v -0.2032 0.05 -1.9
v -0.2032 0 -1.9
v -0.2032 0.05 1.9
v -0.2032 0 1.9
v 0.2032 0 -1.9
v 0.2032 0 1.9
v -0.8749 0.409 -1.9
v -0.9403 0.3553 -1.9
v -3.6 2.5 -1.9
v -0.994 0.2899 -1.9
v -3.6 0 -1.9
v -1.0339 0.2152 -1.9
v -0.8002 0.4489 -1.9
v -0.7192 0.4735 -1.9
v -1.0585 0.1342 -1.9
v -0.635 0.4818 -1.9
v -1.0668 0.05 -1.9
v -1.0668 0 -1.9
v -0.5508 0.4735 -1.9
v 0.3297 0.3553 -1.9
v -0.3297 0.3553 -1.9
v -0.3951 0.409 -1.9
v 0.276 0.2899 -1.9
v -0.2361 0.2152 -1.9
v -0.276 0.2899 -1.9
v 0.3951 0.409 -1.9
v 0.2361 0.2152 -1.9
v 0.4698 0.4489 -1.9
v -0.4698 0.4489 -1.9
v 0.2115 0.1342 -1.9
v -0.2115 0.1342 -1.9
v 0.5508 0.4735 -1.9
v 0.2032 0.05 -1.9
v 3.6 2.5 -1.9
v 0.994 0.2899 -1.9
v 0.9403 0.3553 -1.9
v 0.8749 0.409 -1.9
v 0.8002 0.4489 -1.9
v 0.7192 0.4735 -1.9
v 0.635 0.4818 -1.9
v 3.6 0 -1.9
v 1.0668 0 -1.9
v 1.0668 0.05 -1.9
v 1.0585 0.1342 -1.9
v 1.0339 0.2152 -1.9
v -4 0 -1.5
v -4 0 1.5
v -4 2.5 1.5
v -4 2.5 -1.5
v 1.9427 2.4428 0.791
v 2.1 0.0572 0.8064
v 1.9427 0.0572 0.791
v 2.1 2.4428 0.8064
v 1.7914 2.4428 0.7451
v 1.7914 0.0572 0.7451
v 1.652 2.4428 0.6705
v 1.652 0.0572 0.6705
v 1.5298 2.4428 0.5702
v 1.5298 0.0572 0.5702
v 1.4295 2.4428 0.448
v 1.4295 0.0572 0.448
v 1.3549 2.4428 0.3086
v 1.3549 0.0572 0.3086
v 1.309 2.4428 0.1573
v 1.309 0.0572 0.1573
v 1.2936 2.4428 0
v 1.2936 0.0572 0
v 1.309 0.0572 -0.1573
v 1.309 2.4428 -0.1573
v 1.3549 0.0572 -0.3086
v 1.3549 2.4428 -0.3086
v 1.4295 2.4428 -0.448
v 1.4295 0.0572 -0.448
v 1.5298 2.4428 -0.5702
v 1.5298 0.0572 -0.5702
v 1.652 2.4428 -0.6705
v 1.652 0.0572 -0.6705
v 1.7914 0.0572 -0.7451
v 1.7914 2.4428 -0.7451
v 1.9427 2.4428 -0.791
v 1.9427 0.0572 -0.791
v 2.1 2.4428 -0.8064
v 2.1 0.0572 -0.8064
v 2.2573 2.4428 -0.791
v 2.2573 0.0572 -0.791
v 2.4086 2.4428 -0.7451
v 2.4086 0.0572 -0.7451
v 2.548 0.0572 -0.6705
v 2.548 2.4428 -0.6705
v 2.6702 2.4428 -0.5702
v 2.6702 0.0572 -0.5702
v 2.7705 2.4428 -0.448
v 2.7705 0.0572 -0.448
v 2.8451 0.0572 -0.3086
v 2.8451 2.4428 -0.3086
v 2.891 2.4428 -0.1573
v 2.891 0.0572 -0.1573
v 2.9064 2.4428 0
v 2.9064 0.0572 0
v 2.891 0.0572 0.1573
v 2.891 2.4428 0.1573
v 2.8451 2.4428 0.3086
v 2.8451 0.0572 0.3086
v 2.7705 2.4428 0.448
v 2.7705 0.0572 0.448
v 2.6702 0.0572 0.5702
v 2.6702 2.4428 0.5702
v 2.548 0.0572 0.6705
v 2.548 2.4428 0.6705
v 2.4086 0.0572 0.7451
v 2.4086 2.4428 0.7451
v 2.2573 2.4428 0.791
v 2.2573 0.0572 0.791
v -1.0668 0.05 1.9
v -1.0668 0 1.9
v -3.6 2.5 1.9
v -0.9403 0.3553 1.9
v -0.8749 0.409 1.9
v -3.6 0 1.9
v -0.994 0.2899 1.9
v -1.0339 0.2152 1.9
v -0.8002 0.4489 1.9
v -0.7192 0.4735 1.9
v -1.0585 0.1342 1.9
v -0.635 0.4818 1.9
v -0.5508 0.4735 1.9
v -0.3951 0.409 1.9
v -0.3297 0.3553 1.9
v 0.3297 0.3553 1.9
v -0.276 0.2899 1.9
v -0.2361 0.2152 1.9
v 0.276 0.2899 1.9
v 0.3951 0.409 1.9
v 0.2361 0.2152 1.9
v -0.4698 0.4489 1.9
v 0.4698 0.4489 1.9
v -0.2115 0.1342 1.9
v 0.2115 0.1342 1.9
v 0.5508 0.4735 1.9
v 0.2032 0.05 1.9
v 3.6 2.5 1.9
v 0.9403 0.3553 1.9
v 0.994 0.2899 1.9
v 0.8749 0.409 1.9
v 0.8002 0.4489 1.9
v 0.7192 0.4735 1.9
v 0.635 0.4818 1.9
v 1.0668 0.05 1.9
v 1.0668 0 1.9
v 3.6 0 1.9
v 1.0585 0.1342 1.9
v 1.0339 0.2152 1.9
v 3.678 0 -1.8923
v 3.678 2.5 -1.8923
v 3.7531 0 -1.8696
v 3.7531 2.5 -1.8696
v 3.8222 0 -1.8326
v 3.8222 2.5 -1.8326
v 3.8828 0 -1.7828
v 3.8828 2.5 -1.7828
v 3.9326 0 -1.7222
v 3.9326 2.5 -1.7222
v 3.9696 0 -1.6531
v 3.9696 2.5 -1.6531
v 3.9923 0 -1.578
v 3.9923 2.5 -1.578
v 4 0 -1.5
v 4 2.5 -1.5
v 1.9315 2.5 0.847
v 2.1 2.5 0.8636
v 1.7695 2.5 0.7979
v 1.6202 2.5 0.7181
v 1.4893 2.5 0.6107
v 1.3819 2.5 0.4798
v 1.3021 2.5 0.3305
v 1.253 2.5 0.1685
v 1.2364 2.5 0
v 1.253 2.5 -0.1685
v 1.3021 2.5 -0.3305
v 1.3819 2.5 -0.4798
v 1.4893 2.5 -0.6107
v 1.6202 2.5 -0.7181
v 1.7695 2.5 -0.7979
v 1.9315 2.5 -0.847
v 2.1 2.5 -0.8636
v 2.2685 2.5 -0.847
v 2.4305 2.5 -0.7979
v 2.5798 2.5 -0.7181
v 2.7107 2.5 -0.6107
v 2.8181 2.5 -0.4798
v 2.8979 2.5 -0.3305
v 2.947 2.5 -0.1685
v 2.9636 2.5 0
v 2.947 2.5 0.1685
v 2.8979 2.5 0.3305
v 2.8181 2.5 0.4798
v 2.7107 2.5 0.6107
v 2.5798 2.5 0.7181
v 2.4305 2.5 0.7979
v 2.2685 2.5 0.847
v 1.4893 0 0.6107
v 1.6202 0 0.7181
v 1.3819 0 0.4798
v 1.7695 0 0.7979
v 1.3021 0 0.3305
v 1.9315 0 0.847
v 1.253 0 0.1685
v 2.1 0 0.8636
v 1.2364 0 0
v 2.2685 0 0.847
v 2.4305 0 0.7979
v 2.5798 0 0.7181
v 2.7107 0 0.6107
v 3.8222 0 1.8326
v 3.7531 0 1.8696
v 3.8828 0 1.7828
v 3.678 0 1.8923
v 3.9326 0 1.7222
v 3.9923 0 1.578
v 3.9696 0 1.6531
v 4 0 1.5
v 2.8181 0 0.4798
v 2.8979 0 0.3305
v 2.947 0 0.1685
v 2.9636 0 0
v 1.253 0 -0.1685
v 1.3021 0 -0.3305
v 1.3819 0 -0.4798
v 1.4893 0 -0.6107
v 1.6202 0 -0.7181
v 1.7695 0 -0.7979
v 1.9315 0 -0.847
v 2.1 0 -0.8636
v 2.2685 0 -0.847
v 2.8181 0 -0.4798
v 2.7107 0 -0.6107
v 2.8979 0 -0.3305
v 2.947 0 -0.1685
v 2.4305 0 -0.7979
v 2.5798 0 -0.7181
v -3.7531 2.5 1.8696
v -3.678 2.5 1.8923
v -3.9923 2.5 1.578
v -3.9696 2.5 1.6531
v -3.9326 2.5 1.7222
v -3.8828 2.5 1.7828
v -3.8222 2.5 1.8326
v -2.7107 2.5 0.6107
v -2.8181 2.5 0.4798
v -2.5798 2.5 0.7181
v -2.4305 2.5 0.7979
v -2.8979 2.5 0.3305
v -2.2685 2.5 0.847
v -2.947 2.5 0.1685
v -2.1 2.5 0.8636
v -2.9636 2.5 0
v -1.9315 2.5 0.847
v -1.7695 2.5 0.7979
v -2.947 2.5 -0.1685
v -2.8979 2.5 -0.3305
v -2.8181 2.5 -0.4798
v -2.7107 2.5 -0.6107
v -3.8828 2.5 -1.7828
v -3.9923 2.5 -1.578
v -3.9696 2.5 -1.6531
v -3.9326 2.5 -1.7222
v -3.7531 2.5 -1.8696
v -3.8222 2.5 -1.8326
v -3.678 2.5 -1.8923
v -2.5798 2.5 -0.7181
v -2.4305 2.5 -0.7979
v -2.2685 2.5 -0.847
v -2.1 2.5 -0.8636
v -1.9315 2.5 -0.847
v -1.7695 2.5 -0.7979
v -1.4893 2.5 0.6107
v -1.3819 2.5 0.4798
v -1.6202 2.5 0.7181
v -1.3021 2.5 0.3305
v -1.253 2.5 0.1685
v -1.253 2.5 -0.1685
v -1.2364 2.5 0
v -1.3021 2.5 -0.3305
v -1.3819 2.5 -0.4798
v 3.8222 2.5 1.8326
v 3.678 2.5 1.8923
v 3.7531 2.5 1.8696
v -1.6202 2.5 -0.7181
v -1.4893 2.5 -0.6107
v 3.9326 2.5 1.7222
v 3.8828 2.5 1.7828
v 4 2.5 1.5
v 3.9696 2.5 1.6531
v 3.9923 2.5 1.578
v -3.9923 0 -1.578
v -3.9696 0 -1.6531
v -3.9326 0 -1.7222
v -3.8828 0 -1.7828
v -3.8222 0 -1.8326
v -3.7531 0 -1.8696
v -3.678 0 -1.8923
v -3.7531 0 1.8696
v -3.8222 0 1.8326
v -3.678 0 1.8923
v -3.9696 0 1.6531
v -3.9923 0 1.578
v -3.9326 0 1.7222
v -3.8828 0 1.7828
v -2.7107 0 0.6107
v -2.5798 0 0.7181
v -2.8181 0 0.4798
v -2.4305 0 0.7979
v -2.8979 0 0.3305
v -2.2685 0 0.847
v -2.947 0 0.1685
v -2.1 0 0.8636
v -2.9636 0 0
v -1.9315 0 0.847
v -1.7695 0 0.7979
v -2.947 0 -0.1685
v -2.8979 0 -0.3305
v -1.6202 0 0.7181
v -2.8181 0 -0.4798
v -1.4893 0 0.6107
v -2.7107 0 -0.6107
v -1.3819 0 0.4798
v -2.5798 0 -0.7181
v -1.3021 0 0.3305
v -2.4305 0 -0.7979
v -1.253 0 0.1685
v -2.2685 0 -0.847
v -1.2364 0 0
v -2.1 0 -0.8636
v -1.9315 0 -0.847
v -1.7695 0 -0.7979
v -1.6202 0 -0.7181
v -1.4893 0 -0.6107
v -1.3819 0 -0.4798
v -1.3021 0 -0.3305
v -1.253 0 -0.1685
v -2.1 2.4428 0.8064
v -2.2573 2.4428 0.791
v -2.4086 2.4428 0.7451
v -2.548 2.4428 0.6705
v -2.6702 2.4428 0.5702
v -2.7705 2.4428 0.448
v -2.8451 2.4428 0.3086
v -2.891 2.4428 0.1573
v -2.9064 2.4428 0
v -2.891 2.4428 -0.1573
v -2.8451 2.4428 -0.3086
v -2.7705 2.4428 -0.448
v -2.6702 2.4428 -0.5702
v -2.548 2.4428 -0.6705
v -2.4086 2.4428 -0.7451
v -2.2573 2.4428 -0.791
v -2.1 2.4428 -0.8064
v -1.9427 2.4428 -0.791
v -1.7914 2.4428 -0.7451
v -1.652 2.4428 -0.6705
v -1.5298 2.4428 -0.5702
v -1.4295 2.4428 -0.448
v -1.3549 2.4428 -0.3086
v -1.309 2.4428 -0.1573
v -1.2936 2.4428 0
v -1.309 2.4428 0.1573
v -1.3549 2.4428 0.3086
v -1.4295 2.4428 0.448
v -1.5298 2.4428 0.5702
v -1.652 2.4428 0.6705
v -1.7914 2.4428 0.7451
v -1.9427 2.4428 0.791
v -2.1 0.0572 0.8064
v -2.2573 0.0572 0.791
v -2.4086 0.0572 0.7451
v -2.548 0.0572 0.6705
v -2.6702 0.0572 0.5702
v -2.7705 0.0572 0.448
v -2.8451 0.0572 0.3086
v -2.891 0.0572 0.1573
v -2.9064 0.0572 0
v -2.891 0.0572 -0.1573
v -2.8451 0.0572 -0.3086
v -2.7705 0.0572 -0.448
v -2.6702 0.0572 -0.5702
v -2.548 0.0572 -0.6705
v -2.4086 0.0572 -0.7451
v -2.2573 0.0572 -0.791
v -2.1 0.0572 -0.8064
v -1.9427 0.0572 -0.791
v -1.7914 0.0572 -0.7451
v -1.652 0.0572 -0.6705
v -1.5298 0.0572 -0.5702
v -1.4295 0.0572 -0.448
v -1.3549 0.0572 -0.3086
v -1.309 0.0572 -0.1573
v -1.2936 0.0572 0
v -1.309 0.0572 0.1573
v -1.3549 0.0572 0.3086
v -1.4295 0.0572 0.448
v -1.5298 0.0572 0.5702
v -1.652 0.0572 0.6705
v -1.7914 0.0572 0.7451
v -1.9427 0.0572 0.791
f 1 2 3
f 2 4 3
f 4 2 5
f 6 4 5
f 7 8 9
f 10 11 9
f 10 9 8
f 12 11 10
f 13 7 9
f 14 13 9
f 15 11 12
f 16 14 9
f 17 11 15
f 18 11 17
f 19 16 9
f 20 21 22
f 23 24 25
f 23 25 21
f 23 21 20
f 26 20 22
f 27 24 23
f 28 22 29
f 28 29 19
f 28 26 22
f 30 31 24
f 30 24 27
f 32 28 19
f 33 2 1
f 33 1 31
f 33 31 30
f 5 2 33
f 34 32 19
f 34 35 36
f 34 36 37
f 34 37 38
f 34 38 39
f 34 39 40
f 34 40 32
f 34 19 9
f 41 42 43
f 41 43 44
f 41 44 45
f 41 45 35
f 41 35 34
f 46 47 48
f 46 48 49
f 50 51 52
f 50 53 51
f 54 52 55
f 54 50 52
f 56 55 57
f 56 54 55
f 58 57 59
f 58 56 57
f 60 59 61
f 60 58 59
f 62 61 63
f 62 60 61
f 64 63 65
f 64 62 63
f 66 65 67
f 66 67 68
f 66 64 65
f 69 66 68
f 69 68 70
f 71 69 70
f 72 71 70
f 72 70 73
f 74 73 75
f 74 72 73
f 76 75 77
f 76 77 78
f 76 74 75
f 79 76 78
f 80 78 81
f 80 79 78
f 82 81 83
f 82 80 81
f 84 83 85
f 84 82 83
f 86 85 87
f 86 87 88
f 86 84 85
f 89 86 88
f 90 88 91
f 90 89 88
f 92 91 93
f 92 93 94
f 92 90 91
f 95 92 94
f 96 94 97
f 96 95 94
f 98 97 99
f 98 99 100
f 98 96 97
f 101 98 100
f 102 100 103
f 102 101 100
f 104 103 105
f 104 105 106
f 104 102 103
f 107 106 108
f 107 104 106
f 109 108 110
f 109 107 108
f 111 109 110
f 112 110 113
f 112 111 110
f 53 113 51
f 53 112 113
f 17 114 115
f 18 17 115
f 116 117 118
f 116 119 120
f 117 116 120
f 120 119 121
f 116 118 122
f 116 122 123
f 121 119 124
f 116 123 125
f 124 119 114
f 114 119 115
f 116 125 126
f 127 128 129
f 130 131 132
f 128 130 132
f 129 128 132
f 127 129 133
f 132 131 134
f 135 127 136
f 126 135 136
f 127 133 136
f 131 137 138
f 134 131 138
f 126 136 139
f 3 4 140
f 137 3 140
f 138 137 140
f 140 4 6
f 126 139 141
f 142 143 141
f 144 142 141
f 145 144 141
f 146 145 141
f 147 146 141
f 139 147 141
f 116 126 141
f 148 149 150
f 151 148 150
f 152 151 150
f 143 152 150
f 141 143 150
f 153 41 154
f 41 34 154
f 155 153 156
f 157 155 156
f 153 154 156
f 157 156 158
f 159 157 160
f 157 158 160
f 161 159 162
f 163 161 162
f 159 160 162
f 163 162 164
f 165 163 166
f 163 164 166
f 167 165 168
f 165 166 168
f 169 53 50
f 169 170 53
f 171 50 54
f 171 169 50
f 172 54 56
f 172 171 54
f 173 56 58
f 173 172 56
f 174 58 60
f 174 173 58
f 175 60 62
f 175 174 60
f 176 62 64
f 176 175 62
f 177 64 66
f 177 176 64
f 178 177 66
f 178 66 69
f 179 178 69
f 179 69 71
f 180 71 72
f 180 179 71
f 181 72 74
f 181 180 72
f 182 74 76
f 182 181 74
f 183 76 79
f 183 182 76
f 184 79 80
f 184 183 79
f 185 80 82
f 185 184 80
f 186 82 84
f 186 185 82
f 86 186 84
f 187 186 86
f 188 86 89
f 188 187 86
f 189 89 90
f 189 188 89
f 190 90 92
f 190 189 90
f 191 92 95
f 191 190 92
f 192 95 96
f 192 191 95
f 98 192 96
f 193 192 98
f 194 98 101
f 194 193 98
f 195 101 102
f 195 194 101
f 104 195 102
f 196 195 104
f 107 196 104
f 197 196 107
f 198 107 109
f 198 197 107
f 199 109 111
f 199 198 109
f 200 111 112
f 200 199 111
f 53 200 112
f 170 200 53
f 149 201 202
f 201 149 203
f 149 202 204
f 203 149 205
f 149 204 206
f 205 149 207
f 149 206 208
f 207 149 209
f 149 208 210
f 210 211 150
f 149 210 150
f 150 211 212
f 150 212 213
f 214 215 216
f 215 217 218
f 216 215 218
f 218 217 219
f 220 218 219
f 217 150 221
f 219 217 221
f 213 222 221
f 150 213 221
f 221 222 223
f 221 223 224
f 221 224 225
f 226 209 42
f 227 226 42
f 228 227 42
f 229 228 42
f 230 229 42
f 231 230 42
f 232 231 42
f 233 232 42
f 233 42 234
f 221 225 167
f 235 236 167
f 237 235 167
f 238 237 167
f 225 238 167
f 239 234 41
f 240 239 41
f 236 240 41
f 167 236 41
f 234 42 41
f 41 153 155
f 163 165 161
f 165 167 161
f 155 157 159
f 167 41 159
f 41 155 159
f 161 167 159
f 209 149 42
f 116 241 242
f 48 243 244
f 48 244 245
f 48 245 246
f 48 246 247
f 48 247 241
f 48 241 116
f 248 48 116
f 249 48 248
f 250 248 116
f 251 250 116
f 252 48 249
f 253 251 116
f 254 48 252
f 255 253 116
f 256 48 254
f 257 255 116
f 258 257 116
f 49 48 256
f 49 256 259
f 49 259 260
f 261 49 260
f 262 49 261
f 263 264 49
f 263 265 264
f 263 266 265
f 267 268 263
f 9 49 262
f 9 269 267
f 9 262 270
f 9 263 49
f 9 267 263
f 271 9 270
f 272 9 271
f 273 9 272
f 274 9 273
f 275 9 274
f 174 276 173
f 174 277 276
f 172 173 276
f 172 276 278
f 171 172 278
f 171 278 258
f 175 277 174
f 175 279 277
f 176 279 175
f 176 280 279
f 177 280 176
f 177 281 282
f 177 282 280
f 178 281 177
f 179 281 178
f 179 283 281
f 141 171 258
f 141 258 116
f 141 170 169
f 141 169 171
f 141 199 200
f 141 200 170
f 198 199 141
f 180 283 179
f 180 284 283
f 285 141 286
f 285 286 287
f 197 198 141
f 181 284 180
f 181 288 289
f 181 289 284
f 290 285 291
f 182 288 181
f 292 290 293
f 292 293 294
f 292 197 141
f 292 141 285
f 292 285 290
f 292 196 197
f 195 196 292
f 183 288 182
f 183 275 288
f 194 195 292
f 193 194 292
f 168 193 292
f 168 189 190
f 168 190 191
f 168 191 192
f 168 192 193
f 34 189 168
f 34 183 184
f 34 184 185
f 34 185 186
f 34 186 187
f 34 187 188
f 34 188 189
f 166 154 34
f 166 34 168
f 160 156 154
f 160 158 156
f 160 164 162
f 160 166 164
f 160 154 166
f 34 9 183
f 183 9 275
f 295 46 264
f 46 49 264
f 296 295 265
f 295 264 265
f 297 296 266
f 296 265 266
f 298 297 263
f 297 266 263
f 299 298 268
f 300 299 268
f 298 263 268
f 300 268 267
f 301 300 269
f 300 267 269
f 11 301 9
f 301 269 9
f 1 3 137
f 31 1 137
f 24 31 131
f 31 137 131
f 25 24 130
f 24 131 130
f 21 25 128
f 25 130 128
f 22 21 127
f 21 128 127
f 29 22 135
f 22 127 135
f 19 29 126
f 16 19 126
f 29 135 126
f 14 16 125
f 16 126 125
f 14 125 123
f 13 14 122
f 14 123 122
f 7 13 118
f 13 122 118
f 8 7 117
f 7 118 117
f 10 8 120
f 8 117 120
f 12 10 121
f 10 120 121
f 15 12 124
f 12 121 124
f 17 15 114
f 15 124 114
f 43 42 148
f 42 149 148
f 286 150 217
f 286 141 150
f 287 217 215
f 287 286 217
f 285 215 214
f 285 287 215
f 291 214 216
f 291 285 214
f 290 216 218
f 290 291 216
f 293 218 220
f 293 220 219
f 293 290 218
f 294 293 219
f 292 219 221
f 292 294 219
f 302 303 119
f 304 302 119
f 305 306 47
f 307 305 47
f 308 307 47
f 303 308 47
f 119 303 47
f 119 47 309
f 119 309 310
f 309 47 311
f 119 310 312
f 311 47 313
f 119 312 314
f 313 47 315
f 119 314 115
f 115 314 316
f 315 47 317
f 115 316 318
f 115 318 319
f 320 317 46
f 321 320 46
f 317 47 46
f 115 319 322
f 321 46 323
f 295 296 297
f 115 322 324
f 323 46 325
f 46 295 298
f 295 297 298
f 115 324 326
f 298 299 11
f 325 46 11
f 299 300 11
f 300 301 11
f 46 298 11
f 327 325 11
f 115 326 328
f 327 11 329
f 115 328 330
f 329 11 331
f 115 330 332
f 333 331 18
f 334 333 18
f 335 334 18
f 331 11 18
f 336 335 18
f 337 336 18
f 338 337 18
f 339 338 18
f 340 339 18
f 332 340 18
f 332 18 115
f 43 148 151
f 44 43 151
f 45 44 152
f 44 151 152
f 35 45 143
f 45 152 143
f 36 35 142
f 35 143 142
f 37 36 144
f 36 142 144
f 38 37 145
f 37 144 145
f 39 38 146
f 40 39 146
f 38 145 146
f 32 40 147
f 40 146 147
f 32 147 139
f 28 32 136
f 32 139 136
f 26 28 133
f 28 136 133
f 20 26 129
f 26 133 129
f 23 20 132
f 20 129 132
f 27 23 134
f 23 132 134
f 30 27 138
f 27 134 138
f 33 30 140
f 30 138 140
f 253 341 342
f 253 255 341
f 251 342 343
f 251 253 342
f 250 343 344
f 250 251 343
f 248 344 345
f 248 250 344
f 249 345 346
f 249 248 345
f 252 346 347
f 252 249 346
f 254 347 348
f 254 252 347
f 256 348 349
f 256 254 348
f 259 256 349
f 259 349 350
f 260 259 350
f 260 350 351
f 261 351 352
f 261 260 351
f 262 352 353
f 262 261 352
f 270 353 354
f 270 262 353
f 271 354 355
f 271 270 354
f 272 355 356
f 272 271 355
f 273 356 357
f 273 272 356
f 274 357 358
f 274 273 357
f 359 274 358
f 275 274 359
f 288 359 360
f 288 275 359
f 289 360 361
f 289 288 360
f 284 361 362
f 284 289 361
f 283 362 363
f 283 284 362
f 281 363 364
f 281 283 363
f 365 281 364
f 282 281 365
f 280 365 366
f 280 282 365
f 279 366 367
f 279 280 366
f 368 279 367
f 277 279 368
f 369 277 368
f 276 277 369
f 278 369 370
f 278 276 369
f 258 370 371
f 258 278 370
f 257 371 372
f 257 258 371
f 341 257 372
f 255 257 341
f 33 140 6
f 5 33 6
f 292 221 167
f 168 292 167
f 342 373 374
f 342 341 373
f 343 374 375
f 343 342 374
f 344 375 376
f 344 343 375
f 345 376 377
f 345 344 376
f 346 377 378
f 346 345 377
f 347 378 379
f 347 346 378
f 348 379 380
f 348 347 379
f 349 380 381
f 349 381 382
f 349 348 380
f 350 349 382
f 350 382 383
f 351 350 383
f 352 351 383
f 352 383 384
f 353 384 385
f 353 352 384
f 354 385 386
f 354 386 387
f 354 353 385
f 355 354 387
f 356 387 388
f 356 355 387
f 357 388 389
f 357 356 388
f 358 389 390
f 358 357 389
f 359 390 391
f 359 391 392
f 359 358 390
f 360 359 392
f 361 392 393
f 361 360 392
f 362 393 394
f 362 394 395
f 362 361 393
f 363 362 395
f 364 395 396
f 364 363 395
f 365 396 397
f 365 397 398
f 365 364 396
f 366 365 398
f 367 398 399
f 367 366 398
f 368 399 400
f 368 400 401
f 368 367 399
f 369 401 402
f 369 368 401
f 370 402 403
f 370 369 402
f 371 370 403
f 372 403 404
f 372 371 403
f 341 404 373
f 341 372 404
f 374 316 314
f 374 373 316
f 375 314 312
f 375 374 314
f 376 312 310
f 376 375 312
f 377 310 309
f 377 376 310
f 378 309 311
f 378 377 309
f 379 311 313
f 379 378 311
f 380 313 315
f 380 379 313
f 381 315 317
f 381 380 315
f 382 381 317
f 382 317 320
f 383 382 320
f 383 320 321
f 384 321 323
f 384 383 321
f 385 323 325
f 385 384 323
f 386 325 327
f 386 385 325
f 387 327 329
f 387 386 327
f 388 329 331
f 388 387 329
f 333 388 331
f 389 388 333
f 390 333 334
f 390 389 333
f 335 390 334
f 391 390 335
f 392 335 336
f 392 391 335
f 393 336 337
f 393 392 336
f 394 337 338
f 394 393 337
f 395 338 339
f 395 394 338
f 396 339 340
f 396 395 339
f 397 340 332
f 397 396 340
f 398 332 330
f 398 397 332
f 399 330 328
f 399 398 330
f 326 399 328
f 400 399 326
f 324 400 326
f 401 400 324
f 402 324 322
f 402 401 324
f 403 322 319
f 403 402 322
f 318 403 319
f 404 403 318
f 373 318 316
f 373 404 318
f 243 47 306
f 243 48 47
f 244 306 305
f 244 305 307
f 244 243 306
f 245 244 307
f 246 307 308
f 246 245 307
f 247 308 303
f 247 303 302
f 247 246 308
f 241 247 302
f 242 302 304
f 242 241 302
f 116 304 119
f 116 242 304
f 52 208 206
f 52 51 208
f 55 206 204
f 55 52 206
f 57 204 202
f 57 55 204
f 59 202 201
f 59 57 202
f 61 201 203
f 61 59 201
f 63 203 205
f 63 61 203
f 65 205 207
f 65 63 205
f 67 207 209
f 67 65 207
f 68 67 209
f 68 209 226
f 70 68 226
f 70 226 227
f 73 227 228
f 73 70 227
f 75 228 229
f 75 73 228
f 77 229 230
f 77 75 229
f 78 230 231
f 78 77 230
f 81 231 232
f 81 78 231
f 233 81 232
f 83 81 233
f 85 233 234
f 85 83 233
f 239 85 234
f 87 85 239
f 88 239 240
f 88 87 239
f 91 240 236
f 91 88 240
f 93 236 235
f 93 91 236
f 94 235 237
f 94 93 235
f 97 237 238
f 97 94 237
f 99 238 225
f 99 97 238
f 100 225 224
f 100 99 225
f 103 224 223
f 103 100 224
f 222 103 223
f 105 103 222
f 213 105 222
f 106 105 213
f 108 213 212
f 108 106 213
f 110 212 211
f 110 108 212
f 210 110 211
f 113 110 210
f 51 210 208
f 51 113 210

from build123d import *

# Parameters (mm, degrees)
SKETCH1_W                             = 8
SKETCH1_H                             = 3.8
BE_01_BOSS_EXTRUDE_DEPTH              = 2.5
CE_01_CLAMP_GROOVES_DEPTH             = 3
F_52_0_0635_DIAMETER_HOLE1_AT_2_COUNT = 2
F_52_0_0635_DIAMETER_HOLE1_AT_2_PITCH = 4.2
FILLET1_R                             = 0.4


with BuildPart() as part:
    # Sketch1 → BE-01 Boss Extrude (new body)
    with BuildSketch(Plane(origin=(0, 0, 0), x_dir=(1, 0, 0), z_dir=(0, 1, 0))):
        Rectangle(SKETCH1_W, SKETCH1_H)
    extrude(amount=BE_01_BOSS_EXTRUDE_DEPTH)

    # Sketch2 → CE-01 Clamp Grooves (cut, symmetric)
    with BuildSketch(Plane.XY):
        with BuildLine():
            Line((-6.978653293, -2.49), (-6.978653293, -4.211330321))
            Line((-6.978653293, -4.211330321), (6.978653293, -4.211330321))
            Line((6.978653293, -4.211330321), (6.978653293, -2.49))
            Line((6.978653293, -2.49), (1.0668, -2.49))
            Line((1.0668, -2.49), (1.0668, 0.05))
            ThreePointArc((1.0668, 0.05), (0.635, 0.4818), (0.2032, 0.05))
            Line((0.2032, 0.05), (0.2032, -2.49))
            Line((0.2032, -2.49), (-0.2032, -2.49))
            Line((-0.2032, -2.49), (-0.2032, 0.05))
            ThreePointArc((-0.2032, 0.05), (-0.635, 0.4818), (-1.0668, 0.05))
            Line((-1.0668, 0.05), (-1.0668, -2.49))
            Line((-1.0668, -2.49), (-6.978653293, -2.49))
        make_face()
    extrude(amount=CE_01_CLAMP_GROOVES_DEPTH, both=True, mode=Mode.SUBTRACT)

    # Sketch4 → #52 (0.0635) Diameter Hole1 (revolve, cut)
    with BuildSketch(Plane(origin=(-2.1, 2.5, 0), x_dir=(0, 0, 1), z_dir=(1, 0, 0))):
        Polygon((0, 0), (0, 2.5), (0.8636, 2.5), (0.80645, 2.44285), (0.80645, 0.05715), (0.8636, 0), align=None)
    f_52_0_0635_diameter_hole1 = revolve(axis=Axis((-2.1, 8.85, 0), (0, -1, 0)), mode=Mode.SUBTRACT)

    # #52 (0.0635) Diameter Hole1 at 2: #52 (0.0635) Diameter Hole1 ×2
    with Locations(*[(i * F_52_0_0635_DIAMETER_HOLE1_AT_2_PITCH, 0, 0) for i in range(1, F_52_0_0635_DIAMETER_HOLE1_AT_2_COUNT)]):
        add(f_52_0_0635_diameter_hole1, mode=Mode.SUBTRACT)

    # Fillet1
    fillet1_edges = [part.edges().sort_by_distance(p)[0] for p in [
        (-4, 1.25, -1.9),
        (4, 1.25, -1.9),
        (4, 1.25, 1.9),
        (-4, 1.25, 1.9),
    ]]
    fillet(fillet1_edges, radius=FILLET1_R)


solid = part.part
